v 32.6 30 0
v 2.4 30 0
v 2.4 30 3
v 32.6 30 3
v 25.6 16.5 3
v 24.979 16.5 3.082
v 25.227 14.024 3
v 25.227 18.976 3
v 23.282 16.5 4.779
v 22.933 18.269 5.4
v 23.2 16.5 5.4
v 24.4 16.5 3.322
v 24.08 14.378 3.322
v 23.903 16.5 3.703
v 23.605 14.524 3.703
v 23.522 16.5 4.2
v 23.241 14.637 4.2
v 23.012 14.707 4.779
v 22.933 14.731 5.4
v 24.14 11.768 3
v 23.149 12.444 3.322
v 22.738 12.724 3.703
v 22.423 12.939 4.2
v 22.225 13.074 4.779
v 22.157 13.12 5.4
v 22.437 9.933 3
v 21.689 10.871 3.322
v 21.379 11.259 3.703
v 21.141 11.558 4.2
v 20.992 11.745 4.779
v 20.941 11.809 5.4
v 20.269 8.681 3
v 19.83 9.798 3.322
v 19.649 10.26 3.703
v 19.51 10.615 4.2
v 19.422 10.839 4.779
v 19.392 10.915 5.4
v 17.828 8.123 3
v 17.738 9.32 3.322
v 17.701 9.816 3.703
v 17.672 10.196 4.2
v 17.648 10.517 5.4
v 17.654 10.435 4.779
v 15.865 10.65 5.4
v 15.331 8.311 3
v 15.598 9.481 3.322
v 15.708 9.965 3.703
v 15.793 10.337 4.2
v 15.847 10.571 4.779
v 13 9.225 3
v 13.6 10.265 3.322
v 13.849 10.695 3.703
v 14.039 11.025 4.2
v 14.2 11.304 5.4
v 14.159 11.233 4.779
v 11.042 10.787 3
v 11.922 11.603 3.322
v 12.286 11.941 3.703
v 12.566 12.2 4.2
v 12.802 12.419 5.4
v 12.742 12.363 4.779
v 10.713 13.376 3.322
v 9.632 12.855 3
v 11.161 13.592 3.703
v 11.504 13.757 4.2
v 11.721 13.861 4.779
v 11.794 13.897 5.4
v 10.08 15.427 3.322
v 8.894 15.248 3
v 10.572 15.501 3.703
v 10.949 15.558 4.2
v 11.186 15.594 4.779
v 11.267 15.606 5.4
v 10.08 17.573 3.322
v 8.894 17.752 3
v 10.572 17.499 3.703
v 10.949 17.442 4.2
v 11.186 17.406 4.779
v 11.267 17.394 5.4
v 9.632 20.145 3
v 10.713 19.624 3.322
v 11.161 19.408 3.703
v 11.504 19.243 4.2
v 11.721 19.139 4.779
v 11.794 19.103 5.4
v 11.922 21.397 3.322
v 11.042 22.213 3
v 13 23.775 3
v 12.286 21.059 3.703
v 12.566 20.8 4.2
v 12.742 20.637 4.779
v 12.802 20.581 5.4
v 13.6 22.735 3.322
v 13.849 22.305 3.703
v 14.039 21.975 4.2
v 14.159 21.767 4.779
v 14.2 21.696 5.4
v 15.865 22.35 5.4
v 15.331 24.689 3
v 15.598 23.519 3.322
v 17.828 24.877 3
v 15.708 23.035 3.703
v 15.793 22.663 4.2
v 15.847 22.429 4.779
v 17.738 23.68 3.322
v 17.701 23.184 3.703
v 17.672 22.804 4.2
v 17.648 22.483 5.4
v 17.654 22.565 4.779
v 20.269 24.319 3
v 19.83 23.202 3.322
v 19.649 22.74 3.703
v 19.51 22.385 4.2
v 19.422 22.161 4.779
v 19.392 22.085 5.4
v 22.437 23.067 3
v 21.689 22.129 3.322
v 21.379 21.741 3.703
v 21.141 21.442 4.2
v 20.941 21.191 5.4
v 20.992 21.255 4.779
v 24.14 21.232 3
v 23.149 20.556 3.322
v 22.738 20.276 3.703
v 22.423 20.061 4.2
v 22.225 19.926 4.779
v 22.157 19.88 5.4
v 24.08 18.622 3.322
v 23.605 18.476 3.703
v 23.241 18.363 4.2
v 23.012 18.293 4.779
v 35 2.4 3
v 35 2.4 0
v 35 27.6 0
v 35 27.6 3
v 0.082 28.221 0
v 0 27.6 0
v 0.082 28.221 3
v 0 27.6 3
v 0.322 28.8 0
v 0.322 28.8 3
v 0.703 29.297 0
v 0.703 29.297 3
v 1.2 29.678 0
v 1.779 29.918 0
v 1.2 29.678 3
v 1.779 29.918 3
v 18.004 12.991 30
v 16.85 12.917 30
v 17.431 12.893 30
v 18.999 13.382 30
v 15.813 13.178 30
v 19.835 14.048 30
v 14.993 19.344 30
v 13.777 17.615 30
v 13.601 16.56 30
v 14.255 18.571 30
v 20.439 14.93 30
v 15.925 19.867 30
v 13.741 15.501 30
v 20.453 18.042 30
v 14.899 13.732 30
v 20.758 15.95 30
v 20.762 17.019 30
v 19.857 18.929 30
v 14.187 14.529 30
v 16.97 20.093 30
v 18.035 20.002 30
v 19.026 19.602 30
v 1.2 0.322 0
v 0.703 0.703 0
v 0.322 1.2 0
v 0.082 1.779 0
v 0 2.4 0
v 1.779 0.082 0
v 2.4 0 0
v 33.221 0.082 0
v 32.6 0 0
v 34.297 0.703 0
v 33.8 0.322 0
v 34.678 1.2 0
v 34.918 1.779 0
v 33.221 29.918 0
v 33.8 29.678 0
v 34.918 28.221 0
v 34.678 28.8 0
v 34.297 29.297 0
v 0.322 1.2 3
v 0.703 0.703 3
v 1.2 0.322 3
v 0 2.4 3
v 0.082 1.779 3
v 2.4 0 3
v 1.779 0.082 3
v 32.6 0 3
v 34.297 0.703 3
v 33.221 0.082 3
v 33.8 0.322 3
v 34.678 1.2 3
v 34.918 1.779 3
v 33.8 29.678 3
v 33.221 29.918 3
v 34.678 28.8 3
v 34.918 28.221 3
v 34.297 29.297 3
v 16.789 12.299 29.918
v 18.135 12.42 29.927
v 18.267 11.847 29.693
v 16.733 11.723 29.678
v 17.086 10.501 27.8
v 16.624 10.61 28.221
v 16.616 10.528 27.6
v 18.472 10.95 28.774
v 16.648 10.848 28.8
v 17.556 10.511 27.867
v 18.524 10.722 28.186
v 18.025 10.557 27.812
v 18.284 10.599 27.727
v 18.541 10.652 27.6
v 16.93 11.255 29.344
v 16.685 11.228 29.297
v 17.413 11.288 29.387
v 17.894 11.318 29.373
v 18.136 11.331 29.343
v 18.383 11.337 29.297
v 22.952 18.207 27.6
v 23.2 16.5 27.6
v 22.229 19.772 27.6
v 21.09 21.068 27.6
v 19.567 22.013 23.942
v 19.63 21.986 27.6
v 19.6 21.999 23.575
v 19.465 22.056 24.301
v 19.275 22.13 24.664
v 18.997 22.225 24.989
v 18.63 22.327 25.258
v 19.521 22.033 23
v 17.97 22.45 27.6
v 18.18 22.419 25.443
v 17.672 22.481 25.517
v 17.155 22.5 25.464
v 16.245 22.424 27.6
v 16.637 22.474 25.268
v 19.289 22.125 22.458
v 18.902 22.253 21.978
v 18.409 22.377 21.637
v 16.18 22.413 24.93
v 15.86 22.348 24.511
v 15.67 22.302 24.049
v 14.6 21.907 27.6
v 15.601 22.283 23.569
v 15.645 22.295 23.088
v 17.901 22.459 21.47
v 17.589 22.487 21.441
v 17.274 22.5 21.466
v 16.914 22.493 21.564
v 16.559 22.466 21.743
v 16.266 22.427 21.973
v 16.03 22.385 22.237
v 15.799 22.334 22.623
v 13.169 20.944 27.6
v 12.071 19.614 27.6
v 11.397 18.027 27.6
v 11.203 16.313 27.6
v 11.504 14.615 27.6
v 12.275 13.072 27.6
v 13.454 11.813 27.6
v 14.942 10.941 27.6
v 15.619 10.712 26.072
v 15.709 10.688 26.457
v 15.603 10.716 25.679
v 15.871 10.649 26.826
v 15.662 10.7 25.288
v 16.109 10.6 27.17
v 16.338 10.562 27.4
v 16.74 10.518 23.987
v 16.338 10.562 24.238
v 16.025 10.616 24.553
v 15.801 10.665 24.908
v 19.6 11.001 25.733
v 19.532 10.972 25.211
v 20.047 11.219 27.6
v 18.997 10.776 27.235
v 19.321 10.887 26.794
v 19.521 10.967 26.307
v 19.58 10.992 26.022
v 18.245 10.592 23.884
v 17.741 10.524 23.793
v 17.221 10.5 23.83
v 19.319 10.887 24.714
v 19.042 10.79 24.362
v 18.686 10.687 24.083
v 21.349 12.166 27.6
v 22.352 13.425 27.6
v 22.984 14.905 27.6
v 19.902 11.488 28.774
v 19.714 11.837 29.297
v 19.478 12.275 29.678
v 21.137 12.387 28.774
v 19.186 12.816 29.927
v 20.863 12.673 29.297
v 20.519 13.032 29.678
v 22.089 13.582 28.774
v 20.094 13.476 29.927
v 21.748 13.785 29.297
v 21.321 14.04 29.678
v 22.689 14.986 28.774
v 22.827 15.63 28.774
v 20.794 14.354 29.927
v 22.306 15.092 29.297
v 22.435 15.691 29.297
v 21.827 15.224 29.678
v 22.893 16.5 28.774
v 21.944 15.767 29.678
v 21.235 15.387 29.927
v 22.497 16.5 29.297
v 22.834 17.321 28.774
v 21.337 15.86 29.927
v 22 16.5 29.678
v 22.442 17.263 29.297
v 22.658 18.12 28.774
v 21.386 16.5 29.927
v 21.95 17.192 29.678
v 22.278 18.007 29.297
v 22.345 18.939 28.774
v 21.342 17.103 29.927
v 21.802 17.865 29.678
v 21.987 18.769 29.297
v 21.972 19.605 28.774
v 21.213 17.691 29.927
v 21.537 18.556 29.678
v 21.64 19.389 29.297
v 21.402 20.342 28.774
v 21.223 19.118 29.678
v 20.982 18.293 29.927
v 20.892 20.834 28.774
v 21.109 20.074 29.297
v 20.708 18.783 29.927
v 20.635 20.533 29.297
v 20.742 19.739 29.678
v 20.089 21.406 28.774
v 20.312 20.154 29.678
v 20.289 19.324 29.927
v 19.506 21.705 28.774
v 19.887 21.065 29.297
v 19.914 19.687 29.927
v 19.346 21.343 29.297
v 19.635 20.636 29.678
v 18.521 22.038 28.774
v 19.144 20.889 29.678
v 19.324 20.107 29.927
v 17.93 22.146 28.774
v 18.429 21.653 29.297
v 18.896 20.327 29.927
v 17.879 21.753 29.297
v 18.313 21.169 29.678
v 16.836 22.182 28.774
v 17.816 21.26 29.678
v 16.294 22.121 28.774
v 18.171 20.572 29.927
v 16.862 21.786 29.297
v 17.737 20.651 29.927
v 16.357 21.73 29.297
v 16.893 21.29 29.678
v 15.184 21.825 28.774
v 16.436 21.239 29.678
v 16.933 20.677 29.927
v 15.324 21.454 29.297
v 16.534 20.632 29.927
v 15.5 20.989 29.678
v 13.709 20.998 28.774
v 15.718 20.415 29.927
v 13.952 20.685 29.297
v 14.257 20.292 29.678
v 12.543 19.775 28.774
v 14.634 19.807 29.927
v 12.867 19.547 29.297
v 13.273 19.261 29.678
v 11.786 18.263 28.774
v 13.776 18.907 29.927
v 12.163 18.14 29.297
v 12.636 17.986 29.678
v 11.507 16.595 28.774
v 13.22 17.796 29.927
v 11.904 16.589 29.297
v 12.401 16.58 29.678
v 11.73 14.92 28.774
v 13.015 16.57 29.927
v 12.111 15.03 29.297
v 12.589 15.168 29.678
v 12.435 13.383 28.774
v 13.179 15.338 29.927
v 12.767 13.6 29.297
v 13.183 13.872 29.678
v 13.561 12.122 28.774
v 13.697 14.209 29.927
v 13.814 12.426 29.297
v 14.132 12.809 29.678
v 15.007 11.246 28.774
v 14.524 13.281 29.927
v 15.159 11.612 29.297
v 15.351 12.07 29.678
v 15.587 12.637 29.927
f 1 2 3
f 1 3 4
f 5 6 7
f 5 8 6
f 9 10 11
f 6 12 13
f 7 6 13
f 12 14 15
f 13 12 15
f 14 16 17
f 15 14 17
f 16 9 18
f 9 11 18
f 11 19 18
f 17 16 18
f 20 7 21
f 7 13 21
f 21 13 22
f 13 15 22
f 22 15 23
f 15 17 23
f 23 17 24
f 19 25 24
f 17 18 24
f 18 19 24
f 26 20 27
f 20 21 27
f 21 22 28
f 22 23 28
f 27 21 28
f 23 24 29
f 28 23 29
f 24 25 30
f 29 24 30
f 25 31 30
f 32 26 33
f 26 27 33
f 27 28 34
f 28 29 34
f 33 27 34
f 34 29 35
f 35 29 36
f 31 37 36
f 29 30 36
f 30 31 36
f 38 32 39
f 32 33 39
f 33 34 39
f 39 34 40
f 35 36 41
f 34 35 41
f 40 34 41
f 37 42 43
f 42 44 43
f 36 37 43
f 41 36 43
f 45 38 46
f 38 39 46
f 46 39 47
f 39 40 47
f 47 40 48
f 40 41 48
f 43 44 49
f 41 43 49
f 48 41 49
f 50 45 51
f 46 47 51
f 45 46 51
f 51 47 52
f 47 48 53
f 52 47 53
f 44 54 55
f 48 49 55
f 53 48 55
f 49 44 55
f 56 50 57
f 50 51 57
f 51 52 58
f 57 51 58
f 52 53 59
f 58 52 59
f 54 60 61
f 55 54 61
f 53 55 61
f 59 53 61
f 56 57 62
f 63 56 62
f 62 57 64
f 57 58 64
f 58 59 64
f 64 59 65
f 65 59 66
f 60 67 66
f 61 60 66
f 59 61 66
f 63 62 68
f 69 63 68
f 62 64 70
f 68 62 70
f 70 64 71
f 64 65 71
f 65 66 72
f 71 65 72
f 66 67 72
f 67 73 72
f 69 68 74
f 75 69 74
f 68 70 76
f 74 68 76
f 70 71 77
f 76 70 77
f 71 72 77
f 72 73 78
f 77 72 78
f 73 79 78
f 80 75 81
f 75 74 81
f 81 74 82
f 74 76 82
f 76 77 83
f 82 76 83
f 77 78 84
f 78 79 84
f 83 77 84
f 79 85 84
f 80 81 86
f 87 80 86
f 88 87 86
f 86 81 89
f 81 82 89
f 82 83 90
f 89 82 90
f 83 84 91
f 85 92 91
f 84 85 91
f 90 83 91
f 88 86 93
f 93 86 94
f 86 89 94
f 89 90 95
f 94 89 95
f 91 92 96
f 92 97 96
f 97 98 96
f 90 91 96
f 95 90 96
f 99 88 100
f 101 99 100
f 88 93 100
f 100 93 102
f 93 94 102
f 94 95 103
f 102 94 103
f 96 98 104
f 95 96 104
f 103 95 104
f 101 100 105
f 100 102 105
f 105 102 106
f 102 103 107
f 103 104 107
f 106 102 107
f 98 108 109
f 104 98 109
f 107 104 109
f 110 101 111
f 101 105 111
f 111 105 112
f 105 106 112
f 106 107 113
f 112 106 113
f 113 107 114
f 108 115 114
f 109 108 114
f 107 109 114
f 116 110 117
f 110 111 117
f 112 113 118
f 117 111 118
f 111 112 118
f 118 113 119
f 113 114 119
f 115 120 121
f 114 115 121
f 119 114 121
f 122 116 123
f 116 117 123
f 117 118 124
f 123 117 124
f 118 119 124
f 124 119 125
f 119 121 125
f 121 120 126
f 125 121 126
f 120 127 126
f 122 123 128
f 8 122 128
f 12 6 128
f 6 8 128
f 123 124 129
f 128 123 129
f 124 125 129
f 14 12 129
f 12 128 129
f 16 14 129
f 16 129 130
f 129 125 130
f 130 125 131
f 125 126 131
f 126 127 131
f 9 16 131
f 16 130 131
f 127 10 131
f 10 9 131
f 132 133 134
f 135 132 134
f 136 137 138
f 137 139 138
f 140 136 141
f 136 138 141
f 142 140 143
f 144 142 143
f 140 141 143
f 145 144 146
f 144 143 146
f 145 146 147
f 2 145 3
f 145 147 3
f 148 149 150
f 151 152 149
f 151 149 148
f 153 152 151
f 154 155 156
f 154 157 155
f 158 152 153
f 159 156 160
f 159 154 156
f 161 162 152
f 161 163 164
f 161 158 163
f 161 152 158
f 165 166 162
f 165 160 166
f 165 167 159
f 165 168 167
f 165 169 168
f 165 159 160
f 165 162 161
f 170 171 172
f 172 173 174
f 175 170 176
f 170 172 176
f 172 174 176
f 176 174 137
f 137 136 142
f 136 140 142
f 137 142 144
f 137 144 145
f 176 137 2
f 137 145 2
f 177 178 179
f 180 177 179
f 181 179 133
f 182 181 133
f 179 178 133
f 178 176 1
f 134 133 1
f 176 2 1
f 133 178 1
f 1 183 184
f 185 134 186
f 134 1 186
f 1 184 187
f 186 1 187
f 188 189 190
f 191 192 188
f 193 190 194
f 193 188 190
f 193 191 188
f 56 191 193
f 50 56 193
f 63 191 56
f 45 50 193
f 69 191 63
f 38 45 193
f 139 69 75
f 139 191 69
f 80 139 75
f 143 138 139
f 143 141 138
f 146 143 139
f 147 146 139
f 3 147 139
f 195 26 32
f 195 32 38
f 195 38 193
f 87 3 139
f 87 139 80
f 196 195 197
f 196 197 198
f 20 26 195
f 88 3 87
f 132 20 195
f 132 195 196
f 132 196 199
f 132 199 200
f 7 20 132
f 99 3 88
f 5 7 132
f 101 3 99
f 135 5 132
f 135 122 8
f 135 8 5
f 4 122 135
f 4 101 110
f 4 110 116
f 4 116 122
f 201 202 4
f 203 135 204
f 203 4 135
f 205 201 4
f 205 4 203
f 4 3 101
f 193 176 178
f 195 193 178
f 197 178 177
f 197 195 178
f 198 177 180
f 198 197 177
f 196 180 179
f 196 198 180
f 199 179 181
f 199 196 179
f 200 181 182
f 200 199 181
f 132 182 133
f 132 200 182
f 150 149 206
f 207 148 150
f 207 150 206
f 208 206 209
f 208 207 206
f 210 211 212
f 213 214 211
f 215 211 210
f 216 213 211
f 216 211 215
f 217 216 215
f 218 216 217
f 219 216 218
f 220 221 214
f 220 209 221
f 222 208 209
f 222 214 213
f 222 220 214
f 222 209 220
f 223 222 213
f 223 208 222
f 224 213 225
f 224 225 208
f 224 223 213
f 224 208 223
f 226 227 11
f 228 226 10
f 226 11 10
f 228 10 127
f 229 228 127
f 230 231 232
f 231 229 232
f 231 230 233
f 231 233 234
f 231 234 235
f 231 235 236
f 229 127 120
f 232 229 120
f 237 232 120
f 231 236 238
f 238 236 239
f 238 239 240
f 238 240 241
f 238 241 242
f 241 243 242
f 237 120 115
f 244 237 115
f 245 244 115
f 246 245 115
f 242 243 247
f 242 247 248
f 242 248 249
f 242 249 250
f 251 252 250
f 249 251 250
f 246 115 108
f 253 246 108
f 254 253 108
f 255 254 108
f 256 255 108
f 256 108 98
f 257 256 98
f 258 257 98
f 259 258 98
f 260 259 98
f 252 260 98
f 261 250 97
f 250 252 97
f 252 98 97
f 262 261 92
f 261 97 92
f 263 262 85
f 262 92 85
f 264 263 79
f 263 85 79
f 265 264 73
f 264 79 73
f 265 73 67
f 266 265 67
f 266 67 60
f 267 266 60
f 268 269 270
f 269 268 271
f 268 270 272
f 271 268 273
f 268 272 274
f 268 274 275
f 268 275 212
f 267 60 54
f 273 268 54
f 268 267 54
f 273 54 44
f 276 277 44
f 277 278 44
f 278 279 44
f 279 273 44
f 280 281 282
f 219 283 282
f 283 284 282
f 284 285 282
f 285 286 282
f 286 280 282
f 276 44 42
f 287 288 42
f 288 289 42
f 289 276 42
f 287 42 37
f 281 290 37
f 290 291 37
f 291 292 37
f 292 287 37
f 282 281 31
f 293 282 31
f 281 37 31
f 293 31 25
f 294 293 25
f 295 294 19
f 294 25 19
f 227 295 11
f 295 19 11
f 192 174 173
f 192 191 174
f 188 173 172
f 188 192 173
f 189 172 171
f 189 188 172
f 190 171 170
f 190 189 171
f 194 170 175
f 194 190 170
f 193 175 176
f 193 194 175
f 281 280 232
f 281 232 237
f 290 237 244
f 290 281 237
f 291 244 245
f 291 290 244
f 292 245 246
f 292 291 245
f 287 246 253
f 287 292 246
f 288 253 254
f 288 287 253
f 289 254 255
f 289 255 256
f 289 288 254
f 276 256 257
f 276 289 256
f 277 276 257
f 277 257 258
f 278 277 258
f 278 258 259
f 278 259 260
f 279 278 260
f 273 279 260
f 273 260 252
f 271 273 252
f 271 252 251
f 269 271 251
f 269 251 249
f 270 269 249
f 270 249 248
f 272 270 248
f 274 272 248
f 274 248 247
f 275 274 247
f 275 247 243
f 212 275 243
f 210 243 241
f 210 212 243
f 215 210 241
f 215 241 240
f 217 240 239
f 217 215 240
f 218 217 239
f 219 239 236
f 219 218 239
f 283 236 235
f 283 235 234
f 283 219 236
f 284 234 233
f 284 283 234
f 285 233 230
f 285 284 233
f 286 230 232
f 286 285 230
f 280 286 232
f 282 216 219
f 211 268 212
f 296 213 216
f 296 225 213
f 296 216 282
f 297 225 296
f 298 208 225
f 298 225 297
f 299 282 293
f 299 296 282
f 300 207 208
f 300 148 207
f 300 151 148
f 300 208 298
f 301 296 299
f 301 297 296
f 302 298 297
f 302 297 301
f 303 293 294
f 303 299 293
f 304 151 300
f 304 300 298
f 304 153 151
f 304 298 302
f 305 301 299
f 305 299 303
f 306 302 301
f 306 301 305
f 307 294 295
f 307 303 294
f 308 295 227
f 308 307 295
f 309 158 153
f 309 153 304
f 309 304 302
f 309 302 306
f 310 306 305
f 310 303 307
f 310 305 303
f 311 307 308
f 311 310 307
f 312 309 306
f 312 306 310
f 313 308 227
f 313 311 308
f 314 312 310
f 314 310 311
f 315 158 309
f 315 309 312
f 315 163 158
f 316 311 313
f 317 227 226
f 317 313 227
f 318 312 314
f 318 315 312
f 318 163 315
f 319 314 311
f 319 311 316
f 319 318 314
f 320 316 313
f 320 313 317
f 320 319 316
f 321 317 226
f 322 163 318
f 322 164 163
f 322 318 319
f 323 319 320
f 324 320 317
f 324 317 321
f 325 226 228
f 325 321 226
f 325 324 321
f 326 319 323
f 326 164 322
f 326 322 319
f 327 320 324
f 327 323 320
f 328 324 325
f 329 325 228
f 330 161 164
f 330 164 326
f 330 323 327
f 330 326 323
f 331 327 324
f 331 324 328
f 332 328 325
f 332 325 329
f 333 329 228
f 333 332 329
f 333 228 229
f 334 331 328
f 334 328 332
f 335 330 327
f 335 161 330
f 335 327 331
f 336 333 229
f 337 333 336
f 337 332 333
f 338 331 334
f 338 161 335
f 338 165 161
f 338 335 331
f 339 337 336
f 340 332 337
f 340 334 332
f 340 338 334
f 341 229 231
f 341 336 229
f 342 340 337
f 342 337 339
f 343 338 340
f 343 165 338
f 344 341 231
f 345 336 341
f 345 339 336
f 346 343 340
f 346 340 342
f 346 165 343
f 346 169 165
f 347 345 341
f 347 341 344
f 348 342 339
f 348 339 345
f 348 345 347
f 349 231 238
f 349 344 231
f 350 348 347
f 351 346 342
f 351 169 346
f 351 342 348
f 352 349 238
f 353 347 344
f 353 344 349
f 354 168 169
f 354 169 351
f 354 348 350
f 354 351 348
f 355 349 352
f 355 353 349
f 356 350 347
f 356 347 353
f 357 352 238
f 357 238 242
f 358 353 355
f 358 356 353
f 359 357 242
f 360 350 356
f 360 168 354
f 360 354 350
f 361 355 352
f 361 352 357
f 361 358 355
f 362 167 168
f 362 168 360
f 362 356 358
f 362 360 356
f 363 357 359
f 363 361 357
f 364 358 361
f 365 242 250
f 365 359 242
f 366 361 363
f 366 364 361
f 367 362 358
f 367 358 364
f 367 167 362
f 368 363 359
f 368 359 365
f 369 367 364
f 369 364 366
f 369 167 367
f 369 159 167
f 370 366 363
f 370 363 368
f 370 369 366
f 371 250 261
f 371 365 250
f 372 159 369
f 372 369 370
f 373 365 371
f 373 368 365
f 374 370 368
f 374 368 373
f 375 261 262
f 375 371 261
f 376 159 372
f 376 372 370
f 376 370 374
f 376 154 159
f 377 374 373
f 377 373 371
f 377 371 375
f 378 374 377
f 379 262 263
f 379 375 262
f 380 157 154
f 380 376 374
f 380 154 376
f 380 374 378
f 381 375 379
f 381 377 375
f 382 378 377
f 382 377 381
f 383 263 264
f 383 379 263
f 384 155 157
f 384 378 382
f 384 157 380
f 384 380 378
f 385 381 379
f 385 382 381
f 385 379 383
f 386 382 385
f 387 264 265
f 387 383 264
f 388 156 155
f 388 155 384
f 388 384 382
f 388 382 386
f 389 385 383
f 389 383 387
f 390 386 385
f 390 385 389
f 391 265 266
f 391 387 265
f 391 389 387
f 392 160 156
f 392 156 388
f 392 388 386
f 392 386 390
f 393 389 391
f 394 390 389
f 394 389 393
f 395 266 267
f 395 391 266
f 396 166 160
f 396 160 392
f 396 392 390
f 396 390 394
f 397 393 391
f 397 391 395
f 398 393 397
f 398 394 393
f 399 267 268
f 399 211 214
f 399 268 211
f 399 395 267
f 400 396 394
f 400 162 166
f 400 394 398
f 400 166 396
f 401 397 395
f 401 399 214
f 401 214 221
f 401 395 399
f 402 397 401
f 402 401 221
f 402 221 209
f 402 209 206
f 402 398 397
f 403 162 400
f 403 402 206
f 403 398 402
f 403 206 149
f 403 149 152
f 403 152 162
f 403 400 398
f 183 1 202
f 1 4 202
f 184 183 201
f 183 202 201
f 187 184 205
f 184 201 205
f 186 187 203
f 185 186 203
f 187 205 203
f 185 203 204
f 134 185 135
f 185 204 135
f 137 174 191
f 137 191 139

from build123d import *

# Parameters (mm, degrees)
CYLINDER001_R               = 2
CYLINDER001_DEPTH           = 25
CYLINDER001_PLACEMENT_ANGLE = 101.1
BOX_W                       = 35
BOX_H                       = 30
BOX_DEPTH                   = 3
CYLINDER_R                  = 6
CYLINDER_DEPTH              = 30
FILLET_R                    = 2.4
FILLET001_R                 = 2.4


with BuildPart() as cylinder001:
    # Cylinder001 → Cylinder001 (new body)
    with BuildSketch(Plane.XY):
        Circle(CYLINDER001_R)
    extrude(amount=CYLINDER001_DEPTH)


with BuildPart() as cylinder001_1:
    # Cylinder001 placement: moved
    add(cylinder001.part.moved(Location((17.6, 6.769902, 26.562882))).rotate(Axis((17.6, 6.769902, 26.562882), (-1, 0, 0)), CYLINDER001_PLACEMENT_ANGLE))


with BuildPart() as box:
    # Box → Box (new body)
    with BuildSketch(Plane.XY):
        with Locations((17.5, 15)):
            Rectangle(BOX_W, BOX_H)
    extrude(amount=BOX_DEPTH)


with BuildPart() as fillet001:
    # Cylinder → Cylinder (new body)
    with BuildSketch(Plane(origin=(17.2, 16.5, 0), x_dir=(1, 0, 0), z_dir=(0, 0, 1))):
        Circle(CYLINDER_R)
    extrude(amount=CYLINDER_DEPTH)

    # Fusion: union Box
    add(box.part)

    # Cut: cut Cylinder001
    add(cylinder001_1.part, mode=Mode.SUBTRACT)

    # Fillet
    fillet_edges = [fillet001.edges().sort_by_distance(p)[0] for p in [
        (11.2, 16.5, 3),
    ]]
    fillet(fillet_edges, radius=FILLET_R)

    # Fillet001
    fillet001_edges = [fillet001.edges().sort_by_distance(p)[0] for p in [
        (11.2, 16.5, 30),
        (0, 0, 1.5),
        (0, 30, 1.5),
        (35, 30, 1.5),
        (35, 0, 1.5),
    ]]
    fillet(fillet001_edges, radius=FILLET001_R)


solid = fillet001.part
